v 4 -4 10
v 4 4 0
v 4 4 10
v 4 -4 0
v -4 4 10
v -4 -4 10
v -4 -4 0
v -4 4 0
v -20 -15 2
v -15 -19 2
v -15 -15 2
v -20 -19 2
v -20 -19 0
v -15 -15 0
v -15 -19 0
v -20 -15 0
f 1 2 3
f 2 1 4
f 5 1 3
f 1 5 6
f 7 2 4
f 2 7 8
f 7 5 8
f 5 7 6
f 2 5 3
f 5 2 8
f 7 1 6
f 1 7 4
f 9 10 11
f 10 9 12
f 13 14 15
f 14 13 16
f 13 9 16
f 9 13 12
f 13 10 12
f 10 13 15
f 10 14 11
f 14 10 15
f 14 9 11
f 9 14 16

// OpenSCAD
translate([0, 0, 5]) color([0,1,0,0.9]) cube([8, 8, 10], center=true);
translate([-19.75, -18.75, 1]) color([1,0,0]) cube([0.5, 0.5, 2], center=true);
translate([-19.25, -18.75, 1]) color([1,0,0]) cube([0.5, 0.5, 2], center=true);
translate([-18.75, -18.75, 1]) color([1,0,0]) cube([0.5, 0.5, 2], center=true);
translate([-18.25, -18.75, 1]) color([1,0,0]) cube([0.5, 0.5, 2], center=true);
translate([-17.75, -18.75, 1]) color([1,0,0]) cube([0.5, 0.5, 2], center=true);
translate([-17.25, -18.75, 1]) color([1,0,0]) cube([0.5, 0.5, 2], center=true);
translate([-16.75, -18.75, 1]) color([1,0,0]) cube([0.5, 0.5, 2], center=true);
translate([-16.25, -18.75, 1]) color([1,0,0]) cube([0.5, 0.5, 2], center=true);
translate([-15.75, -18.75, 1]) color([1,0,0]) cube([0.5, 0.5, 2], center=true);
translate([-15.25, -18.75, 1]) color([1,0,0]) cube([0.5, 0.5, 2], center=true);
translate([-19.75, -18.25, 1]) color([1,0,0]) cube([0.5, 0.5, 2], center=true);
translate([-19.25, -18.25, 1]) color([1,0,0]) cube([0.5, 0.5, 2], center=true);
translate([-18.75, -18.25, 1]) color([1,0,0]) cube([0.5, 0.5, 2], center=true);
translate([-18.25, -18.25, 1]) color([1,0,0]) cube([0.5, 0.5, 2], center=true);
translate([-17.75, -18.25, 1]) color([1,0,0]) cube([0.5, 0.5, 2], center=true);
translate([-17.25, -18.25, 1]) color([1,0,0]) cube([0.5, 0.5, 2], center=true);
translate([-16.75, -18.25, 1]) color([1,0,0]) cube([0.5, 0.5, 2], center=true);
translate([-16.25, -18.25, 1]) color([1,0,0]) cube([0.5, 0.5, 2], center=true);
translate([-15.75, -18.25, 1]) color([1,0,0]) cube([0.5, 0.5, 2], center=true);
translate([-15.25, -18.25, 1]) color([1,0,0]) cube([0.5, 0.5, 2], center=true);
translate([-19.75, -17.75, 1]) color([1,0,0]) cube([0.5, 0.5, 2], center=true);
translate([-19.25, -17.75, 1]) color([1,0,0]) cube([0.5, 0.5, 2], center=true);
translate([-18.75, -17.75, 1]) color([1,0,0]) cube([0.5, 0.5, 2], center=true);
translate([-18.25, -17.75, 1]) color([1,0,0]) cube([0.5, 0.5, 2], center=true);
translate([-17.75, -17.75, 1]) color([1,0,0]) cube([0.5, 0.5, 2], center=true);
translate([-17.25, -17.75, 1]) color([1,0,0]) cube([0.5, 0.5, 2], center=true);
translate([-16.75, -17.75, 1]) color([1,0,0]) cube([0.5, 0.5, 2], center=true);
translate([-16.25, -17.75, 1]) color([1,0,0]) cube([0.5, 0.5, 2], center=true);
translate([-15.75, -17.75, 1]) color([1,0,0]) cube([0.5, 0.5, 2], center=true);
translate([-15.25, -17.75, 1]) color([1,0,0]) cube([0.5, 0.5, 2], center=true);
translate([-19.75, -17.25, 1]) color([1,0,0]) cube([0.5, 0.5, 2], center=true);
translate([-19.25, -17.25, 1]) color([1,0,0]) cube([0.5, 0.5, 2], center=true);
translate([-18.75, -17.25, 1]) color([1,0,0]) cube([0.5, 0.5, 2], center=true);
translate([-18.25, -17.25, 1]) color([1,0,0]) cube([0.5, 0.5, 2], center=true);
translate([-17.75, -17.25, 1]) color([1,0,0]) cube([0.5, 0.5, 2], center=true);
translate([-17.25, -17.25, 1]) color([1,0,0]) cube([0.5, 0.5, 2], center=true);
translate([-16.75, -17.25, 1]) color([1,0,0]) cube([0.5, 0.5, 2], center=true);
translate([-16.25, -17.25, 1]) color([1,0,0]) cube([0.5, 0.5, 2], center=true);
translate([-15.75, -17.25, 1]) color([1,0,0]) cube([0.5, 0.5, 2], center=true);
translate([-15.25, -17.25, 1]) color([1,0,0]) cube([0.5, 0.5, 2], center=true);
translate([-19.75, -16.75, 1]) color([1,0,0]) cube([0.5, 0.5, 2], center=true);
translate([-19.25, -16.75, 1]) color([1,0,0]) cube([0.5, 0.5, 2], center=true);
translate([-18.75, -16.75, 1]) color([1,0,0]) cube([0.5, 0.5, 2], center=true);
translate([-18.25, -16.75, 1]) color([1,0,0]) cube([0.5, 0.5, 2], center=true);
translate([-17.75, -16.75, 1]) color([1,0,0]) cube([0.5, 0.5, 2], center=true);
translate([-17.25, -16.75, 1]) color([1,0,0]) cube([0.5, 0.5, 2], center=true);
translate([-16.75, -16.75, 1]) color([1,0,0]) cube([0.5, 0.5, 2], center=true);
translate([-16.25, -16.75, 1]) color([1,0,0]) cube([0.5, 0.5, 2], center=true);
translate([-15.75, -16.75, 1]) color([1,0,0]) cube([0.5, 0.5, 2], center=true);
translate([-15.25, -16.75, 1]) color([1,0,0]) cube([0.5, 0.5, 2], center=true);
translate([-19.75, -16.25, 1]) color([1,0,0]) cube([0.5, 0.5, 2], center=true);
translate([-19.25, -16.25, 1]) color([1,0,0]) cube([0.5, 0.5, 2], center=true);
translate([-18.75, -16.25, 1]) color([1,0,0]) cube([0.5, 0.5, 2], center=true);
translate([-18.25, -16.25, 1]) color([1,0,0]) cube([0.5, 0.5, 2], center=true);
translate([-17.75, -16.25, 1]) color([1,0,0]) cube([0.5, 0.5, 2], center=true);
translate([-17.25, -16.25, 1]) color([1,0,0]) cube([0.5, 0.5, 2], center=true);
translate([-16.75, -16.25, 1]) color([1,0,0]) cube([0.5, 0.5, 2], center=true);
translate([-16.25, -16.25, 1]) color([1,0,0]) cube([0.5, 0.5, 2], center=true);
translate([-15.75, -16.25, 1]) color([1,0,0]) cube([0.5, 0.5, 2], center=true);
translate([-15.25, -16.25, 1]) color([1,0,0]) cube([0.5, 0.5, 2], center=true);
translate([-19.75, -15.75, 1]) color([1,0,0]) cube([0.5, 0.5, 2], center=true);
translate([-19.25, -15.75, 1]) color([1,0,0]) cube([0.5, 0.5, 2], center=true);
translate([-18.75, -15.75, 1]) color([1,0,0]) cube([0.5, 0.5, 2], center=true);
translate([-18.25, -15.75, 1]) color([1,0,0]) cube([0.5, 0.5, 2], center=true);
translate([-17.75, -15.75, 1]) color([1,0,0]) cube([0.5, 0.5, 2], center=true);
translate([-17.25, -15.75, 1]) color([1,0,0]) cube([0.5, 0.5, 2], center=true);
translate([-16.75, -15.75, 1]) color([1,0,0]) cube([0.5, 0.5, 2], center=true);
translate([-16.25, -15.75, 1]) color([1,0,0]) cube([0.5, 0.5, 2], center=true);
translate([-15.75, -15.75, 1]) color([1,0,0]) cube([0.5, 0.5, 2], center=true);
translate([-15.25, -15.75, 1]) color([1,0,0]) cube([0.5, 0.5, 2], center=true);
translate([-19.75, -15.25, 1]) color([1,0,0]) cube([0.5, 0.5, 2], center=true);
translate([-19.25, -15.25, 1]) color([1,0,0]) cube([0.5, 0.5, 2], center=true);
translate([-18.75, -15.25, 1]) color([1,0,0]) cube([0.5, 0.5, 2], center=true);
translate([-18.25, -15.25, 1]) color([1,0,0]) cube([0.5, 0.5, 2], center=true);
translate([-17.75, -15.25, 1]) color([1,0,0]) cube([0.5, 0.5, 2], center=true);
translate([-17.25, -15.25, 1]) color([1,0,0]) cube([0.5, 0.5, 2], center=true);
translate([-16.75, -15.25, 1]) color([1,0,0]) cube([0.5, 0.5, 2], center=true);
translate([-16.25, -15.25, 1]) color([1,0,0]) cube([0.5, 0.5, 2], center=true);
translate([-15.75, -15.25, 1]) color([1,0,0]) cube([0.5, 0.5, 2], center=true);
translate([-15.25, -15.25, 1]) color([1,0,0]) cube([0.5, 0.5, 2], center=true);
